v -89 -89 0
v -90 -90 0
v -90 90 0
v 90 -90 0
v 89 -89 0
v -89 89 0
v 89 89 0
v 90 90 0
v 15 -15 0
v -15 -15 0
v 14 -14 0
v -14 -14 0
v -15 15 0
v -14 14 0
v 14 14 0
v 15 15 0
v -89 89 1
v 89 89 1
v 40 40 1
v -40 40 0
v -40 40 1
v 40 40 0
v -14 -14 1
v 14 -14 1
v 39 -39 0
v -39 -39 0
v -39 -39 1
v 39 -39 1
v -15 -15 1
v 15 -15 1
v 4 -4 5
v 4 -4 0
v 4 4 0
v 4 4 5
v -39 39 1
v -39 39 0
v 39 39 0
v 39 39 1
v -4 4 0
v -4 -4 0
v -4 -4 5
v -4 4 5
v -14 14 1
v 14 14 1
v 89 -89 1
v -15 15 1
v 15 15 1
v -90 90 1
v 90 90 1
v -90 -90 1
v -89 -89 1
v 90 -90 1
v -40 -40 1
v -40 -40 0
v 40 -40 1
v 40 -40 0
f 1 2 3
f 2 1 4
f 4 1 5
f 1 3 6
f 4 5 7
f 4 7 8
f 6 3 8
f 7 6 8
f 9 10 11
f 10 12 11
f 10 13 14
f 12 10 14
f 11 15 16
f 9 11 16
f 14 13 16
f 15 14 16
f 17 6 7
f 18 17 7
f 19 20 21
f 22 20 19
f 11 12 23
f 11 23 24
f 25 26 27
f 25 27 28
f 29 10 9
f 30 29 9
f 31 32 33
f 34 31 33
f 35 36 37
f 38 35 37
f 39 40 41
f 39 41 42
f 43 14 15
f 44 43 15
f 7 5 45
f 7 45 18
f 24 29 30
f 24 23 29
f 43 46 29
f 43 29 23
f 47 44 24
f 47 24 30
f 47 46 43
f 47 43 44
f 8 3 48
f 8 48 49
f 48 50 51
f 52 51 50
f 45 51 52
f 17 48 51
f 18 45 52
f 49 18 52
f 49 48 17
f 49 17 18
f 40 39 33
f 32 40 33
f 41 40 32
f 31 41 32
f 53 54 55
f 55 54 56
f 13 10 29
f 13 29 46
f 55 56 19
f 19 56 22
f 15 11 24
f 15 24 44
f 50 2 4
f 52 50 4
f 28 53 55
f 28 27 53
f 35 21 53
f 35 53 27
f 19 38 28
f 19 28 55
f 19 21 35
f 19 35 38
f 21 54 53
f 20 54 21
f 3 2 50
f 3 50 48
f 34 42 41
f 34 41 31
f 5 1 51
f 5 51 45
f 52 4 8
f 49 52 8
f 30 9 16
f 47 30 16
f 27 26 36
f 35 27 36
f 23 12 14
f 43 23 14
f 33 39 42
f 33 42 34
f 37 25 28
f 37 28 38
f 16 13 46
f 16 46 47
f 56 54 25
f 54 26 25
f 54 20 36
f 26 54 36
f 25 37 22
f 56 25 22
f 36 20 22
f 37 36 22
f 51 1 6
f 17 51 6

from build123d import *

# Parameters (mm, degrees)
F0_W     = 80
F0_H     = 80
F0_W_2   = 78
F0_H_2   = 78
F1_DEPTH = 1
F0_W_3   = 30
F0_H_3   = 30
F0_W_4   = 28
F0_H_4   = 28
F0_W_5   = 180
F0_H_5   = 180
F0_W_6   = 178
F0_H_6   = 178
F2_W     = 8
F2_H     = 8
F3_DEPTH = 5


with BuildPart() as f1:
    # F0 (on Top) → F1 (new body)
    with BuildSketch(Plane.XY):
        Rectangle(F0_W, F0_H)
        Rectangle(F0_W_2, F0_H_2, mode=Mode.SUBTRACT)
    extrude(amount=F1_DEPTH)


with BuildPart() as f1b:
    # F0 (on Top) → F1, piece 2 (new body)
    with BuildSketch(Plane.XY):
        Rectangle(F0_W_3, F0_H_3)
        Rectangle(F0_W_4, F0_H_4, mode=Mode.SUBTRACT)
    extrude(amount=F1_DEPTH)


with BuildPart() as f1c:
    # F0 (on Top) → F1, piece 3 (new body)
    with BuildSketch(Plane.XY):
        Rectangle(F0_W_5, F0_H_5)
        Rectangle(F0_W_6, F0_H_6, mode=Mode.SUBTRACT)
    extrude(amount=F1_DEPTH)


with BuildPart() as f3:
    # F2 (on Top) → F3 (new body)
    with BuildSketch(Plane.XY):
        Rectangle(F2_W, F2_H)
    extrude(amount=F3_DEPTH)


solid = Compound([f1.part, f1b.part, f1c.part, f3.part])
